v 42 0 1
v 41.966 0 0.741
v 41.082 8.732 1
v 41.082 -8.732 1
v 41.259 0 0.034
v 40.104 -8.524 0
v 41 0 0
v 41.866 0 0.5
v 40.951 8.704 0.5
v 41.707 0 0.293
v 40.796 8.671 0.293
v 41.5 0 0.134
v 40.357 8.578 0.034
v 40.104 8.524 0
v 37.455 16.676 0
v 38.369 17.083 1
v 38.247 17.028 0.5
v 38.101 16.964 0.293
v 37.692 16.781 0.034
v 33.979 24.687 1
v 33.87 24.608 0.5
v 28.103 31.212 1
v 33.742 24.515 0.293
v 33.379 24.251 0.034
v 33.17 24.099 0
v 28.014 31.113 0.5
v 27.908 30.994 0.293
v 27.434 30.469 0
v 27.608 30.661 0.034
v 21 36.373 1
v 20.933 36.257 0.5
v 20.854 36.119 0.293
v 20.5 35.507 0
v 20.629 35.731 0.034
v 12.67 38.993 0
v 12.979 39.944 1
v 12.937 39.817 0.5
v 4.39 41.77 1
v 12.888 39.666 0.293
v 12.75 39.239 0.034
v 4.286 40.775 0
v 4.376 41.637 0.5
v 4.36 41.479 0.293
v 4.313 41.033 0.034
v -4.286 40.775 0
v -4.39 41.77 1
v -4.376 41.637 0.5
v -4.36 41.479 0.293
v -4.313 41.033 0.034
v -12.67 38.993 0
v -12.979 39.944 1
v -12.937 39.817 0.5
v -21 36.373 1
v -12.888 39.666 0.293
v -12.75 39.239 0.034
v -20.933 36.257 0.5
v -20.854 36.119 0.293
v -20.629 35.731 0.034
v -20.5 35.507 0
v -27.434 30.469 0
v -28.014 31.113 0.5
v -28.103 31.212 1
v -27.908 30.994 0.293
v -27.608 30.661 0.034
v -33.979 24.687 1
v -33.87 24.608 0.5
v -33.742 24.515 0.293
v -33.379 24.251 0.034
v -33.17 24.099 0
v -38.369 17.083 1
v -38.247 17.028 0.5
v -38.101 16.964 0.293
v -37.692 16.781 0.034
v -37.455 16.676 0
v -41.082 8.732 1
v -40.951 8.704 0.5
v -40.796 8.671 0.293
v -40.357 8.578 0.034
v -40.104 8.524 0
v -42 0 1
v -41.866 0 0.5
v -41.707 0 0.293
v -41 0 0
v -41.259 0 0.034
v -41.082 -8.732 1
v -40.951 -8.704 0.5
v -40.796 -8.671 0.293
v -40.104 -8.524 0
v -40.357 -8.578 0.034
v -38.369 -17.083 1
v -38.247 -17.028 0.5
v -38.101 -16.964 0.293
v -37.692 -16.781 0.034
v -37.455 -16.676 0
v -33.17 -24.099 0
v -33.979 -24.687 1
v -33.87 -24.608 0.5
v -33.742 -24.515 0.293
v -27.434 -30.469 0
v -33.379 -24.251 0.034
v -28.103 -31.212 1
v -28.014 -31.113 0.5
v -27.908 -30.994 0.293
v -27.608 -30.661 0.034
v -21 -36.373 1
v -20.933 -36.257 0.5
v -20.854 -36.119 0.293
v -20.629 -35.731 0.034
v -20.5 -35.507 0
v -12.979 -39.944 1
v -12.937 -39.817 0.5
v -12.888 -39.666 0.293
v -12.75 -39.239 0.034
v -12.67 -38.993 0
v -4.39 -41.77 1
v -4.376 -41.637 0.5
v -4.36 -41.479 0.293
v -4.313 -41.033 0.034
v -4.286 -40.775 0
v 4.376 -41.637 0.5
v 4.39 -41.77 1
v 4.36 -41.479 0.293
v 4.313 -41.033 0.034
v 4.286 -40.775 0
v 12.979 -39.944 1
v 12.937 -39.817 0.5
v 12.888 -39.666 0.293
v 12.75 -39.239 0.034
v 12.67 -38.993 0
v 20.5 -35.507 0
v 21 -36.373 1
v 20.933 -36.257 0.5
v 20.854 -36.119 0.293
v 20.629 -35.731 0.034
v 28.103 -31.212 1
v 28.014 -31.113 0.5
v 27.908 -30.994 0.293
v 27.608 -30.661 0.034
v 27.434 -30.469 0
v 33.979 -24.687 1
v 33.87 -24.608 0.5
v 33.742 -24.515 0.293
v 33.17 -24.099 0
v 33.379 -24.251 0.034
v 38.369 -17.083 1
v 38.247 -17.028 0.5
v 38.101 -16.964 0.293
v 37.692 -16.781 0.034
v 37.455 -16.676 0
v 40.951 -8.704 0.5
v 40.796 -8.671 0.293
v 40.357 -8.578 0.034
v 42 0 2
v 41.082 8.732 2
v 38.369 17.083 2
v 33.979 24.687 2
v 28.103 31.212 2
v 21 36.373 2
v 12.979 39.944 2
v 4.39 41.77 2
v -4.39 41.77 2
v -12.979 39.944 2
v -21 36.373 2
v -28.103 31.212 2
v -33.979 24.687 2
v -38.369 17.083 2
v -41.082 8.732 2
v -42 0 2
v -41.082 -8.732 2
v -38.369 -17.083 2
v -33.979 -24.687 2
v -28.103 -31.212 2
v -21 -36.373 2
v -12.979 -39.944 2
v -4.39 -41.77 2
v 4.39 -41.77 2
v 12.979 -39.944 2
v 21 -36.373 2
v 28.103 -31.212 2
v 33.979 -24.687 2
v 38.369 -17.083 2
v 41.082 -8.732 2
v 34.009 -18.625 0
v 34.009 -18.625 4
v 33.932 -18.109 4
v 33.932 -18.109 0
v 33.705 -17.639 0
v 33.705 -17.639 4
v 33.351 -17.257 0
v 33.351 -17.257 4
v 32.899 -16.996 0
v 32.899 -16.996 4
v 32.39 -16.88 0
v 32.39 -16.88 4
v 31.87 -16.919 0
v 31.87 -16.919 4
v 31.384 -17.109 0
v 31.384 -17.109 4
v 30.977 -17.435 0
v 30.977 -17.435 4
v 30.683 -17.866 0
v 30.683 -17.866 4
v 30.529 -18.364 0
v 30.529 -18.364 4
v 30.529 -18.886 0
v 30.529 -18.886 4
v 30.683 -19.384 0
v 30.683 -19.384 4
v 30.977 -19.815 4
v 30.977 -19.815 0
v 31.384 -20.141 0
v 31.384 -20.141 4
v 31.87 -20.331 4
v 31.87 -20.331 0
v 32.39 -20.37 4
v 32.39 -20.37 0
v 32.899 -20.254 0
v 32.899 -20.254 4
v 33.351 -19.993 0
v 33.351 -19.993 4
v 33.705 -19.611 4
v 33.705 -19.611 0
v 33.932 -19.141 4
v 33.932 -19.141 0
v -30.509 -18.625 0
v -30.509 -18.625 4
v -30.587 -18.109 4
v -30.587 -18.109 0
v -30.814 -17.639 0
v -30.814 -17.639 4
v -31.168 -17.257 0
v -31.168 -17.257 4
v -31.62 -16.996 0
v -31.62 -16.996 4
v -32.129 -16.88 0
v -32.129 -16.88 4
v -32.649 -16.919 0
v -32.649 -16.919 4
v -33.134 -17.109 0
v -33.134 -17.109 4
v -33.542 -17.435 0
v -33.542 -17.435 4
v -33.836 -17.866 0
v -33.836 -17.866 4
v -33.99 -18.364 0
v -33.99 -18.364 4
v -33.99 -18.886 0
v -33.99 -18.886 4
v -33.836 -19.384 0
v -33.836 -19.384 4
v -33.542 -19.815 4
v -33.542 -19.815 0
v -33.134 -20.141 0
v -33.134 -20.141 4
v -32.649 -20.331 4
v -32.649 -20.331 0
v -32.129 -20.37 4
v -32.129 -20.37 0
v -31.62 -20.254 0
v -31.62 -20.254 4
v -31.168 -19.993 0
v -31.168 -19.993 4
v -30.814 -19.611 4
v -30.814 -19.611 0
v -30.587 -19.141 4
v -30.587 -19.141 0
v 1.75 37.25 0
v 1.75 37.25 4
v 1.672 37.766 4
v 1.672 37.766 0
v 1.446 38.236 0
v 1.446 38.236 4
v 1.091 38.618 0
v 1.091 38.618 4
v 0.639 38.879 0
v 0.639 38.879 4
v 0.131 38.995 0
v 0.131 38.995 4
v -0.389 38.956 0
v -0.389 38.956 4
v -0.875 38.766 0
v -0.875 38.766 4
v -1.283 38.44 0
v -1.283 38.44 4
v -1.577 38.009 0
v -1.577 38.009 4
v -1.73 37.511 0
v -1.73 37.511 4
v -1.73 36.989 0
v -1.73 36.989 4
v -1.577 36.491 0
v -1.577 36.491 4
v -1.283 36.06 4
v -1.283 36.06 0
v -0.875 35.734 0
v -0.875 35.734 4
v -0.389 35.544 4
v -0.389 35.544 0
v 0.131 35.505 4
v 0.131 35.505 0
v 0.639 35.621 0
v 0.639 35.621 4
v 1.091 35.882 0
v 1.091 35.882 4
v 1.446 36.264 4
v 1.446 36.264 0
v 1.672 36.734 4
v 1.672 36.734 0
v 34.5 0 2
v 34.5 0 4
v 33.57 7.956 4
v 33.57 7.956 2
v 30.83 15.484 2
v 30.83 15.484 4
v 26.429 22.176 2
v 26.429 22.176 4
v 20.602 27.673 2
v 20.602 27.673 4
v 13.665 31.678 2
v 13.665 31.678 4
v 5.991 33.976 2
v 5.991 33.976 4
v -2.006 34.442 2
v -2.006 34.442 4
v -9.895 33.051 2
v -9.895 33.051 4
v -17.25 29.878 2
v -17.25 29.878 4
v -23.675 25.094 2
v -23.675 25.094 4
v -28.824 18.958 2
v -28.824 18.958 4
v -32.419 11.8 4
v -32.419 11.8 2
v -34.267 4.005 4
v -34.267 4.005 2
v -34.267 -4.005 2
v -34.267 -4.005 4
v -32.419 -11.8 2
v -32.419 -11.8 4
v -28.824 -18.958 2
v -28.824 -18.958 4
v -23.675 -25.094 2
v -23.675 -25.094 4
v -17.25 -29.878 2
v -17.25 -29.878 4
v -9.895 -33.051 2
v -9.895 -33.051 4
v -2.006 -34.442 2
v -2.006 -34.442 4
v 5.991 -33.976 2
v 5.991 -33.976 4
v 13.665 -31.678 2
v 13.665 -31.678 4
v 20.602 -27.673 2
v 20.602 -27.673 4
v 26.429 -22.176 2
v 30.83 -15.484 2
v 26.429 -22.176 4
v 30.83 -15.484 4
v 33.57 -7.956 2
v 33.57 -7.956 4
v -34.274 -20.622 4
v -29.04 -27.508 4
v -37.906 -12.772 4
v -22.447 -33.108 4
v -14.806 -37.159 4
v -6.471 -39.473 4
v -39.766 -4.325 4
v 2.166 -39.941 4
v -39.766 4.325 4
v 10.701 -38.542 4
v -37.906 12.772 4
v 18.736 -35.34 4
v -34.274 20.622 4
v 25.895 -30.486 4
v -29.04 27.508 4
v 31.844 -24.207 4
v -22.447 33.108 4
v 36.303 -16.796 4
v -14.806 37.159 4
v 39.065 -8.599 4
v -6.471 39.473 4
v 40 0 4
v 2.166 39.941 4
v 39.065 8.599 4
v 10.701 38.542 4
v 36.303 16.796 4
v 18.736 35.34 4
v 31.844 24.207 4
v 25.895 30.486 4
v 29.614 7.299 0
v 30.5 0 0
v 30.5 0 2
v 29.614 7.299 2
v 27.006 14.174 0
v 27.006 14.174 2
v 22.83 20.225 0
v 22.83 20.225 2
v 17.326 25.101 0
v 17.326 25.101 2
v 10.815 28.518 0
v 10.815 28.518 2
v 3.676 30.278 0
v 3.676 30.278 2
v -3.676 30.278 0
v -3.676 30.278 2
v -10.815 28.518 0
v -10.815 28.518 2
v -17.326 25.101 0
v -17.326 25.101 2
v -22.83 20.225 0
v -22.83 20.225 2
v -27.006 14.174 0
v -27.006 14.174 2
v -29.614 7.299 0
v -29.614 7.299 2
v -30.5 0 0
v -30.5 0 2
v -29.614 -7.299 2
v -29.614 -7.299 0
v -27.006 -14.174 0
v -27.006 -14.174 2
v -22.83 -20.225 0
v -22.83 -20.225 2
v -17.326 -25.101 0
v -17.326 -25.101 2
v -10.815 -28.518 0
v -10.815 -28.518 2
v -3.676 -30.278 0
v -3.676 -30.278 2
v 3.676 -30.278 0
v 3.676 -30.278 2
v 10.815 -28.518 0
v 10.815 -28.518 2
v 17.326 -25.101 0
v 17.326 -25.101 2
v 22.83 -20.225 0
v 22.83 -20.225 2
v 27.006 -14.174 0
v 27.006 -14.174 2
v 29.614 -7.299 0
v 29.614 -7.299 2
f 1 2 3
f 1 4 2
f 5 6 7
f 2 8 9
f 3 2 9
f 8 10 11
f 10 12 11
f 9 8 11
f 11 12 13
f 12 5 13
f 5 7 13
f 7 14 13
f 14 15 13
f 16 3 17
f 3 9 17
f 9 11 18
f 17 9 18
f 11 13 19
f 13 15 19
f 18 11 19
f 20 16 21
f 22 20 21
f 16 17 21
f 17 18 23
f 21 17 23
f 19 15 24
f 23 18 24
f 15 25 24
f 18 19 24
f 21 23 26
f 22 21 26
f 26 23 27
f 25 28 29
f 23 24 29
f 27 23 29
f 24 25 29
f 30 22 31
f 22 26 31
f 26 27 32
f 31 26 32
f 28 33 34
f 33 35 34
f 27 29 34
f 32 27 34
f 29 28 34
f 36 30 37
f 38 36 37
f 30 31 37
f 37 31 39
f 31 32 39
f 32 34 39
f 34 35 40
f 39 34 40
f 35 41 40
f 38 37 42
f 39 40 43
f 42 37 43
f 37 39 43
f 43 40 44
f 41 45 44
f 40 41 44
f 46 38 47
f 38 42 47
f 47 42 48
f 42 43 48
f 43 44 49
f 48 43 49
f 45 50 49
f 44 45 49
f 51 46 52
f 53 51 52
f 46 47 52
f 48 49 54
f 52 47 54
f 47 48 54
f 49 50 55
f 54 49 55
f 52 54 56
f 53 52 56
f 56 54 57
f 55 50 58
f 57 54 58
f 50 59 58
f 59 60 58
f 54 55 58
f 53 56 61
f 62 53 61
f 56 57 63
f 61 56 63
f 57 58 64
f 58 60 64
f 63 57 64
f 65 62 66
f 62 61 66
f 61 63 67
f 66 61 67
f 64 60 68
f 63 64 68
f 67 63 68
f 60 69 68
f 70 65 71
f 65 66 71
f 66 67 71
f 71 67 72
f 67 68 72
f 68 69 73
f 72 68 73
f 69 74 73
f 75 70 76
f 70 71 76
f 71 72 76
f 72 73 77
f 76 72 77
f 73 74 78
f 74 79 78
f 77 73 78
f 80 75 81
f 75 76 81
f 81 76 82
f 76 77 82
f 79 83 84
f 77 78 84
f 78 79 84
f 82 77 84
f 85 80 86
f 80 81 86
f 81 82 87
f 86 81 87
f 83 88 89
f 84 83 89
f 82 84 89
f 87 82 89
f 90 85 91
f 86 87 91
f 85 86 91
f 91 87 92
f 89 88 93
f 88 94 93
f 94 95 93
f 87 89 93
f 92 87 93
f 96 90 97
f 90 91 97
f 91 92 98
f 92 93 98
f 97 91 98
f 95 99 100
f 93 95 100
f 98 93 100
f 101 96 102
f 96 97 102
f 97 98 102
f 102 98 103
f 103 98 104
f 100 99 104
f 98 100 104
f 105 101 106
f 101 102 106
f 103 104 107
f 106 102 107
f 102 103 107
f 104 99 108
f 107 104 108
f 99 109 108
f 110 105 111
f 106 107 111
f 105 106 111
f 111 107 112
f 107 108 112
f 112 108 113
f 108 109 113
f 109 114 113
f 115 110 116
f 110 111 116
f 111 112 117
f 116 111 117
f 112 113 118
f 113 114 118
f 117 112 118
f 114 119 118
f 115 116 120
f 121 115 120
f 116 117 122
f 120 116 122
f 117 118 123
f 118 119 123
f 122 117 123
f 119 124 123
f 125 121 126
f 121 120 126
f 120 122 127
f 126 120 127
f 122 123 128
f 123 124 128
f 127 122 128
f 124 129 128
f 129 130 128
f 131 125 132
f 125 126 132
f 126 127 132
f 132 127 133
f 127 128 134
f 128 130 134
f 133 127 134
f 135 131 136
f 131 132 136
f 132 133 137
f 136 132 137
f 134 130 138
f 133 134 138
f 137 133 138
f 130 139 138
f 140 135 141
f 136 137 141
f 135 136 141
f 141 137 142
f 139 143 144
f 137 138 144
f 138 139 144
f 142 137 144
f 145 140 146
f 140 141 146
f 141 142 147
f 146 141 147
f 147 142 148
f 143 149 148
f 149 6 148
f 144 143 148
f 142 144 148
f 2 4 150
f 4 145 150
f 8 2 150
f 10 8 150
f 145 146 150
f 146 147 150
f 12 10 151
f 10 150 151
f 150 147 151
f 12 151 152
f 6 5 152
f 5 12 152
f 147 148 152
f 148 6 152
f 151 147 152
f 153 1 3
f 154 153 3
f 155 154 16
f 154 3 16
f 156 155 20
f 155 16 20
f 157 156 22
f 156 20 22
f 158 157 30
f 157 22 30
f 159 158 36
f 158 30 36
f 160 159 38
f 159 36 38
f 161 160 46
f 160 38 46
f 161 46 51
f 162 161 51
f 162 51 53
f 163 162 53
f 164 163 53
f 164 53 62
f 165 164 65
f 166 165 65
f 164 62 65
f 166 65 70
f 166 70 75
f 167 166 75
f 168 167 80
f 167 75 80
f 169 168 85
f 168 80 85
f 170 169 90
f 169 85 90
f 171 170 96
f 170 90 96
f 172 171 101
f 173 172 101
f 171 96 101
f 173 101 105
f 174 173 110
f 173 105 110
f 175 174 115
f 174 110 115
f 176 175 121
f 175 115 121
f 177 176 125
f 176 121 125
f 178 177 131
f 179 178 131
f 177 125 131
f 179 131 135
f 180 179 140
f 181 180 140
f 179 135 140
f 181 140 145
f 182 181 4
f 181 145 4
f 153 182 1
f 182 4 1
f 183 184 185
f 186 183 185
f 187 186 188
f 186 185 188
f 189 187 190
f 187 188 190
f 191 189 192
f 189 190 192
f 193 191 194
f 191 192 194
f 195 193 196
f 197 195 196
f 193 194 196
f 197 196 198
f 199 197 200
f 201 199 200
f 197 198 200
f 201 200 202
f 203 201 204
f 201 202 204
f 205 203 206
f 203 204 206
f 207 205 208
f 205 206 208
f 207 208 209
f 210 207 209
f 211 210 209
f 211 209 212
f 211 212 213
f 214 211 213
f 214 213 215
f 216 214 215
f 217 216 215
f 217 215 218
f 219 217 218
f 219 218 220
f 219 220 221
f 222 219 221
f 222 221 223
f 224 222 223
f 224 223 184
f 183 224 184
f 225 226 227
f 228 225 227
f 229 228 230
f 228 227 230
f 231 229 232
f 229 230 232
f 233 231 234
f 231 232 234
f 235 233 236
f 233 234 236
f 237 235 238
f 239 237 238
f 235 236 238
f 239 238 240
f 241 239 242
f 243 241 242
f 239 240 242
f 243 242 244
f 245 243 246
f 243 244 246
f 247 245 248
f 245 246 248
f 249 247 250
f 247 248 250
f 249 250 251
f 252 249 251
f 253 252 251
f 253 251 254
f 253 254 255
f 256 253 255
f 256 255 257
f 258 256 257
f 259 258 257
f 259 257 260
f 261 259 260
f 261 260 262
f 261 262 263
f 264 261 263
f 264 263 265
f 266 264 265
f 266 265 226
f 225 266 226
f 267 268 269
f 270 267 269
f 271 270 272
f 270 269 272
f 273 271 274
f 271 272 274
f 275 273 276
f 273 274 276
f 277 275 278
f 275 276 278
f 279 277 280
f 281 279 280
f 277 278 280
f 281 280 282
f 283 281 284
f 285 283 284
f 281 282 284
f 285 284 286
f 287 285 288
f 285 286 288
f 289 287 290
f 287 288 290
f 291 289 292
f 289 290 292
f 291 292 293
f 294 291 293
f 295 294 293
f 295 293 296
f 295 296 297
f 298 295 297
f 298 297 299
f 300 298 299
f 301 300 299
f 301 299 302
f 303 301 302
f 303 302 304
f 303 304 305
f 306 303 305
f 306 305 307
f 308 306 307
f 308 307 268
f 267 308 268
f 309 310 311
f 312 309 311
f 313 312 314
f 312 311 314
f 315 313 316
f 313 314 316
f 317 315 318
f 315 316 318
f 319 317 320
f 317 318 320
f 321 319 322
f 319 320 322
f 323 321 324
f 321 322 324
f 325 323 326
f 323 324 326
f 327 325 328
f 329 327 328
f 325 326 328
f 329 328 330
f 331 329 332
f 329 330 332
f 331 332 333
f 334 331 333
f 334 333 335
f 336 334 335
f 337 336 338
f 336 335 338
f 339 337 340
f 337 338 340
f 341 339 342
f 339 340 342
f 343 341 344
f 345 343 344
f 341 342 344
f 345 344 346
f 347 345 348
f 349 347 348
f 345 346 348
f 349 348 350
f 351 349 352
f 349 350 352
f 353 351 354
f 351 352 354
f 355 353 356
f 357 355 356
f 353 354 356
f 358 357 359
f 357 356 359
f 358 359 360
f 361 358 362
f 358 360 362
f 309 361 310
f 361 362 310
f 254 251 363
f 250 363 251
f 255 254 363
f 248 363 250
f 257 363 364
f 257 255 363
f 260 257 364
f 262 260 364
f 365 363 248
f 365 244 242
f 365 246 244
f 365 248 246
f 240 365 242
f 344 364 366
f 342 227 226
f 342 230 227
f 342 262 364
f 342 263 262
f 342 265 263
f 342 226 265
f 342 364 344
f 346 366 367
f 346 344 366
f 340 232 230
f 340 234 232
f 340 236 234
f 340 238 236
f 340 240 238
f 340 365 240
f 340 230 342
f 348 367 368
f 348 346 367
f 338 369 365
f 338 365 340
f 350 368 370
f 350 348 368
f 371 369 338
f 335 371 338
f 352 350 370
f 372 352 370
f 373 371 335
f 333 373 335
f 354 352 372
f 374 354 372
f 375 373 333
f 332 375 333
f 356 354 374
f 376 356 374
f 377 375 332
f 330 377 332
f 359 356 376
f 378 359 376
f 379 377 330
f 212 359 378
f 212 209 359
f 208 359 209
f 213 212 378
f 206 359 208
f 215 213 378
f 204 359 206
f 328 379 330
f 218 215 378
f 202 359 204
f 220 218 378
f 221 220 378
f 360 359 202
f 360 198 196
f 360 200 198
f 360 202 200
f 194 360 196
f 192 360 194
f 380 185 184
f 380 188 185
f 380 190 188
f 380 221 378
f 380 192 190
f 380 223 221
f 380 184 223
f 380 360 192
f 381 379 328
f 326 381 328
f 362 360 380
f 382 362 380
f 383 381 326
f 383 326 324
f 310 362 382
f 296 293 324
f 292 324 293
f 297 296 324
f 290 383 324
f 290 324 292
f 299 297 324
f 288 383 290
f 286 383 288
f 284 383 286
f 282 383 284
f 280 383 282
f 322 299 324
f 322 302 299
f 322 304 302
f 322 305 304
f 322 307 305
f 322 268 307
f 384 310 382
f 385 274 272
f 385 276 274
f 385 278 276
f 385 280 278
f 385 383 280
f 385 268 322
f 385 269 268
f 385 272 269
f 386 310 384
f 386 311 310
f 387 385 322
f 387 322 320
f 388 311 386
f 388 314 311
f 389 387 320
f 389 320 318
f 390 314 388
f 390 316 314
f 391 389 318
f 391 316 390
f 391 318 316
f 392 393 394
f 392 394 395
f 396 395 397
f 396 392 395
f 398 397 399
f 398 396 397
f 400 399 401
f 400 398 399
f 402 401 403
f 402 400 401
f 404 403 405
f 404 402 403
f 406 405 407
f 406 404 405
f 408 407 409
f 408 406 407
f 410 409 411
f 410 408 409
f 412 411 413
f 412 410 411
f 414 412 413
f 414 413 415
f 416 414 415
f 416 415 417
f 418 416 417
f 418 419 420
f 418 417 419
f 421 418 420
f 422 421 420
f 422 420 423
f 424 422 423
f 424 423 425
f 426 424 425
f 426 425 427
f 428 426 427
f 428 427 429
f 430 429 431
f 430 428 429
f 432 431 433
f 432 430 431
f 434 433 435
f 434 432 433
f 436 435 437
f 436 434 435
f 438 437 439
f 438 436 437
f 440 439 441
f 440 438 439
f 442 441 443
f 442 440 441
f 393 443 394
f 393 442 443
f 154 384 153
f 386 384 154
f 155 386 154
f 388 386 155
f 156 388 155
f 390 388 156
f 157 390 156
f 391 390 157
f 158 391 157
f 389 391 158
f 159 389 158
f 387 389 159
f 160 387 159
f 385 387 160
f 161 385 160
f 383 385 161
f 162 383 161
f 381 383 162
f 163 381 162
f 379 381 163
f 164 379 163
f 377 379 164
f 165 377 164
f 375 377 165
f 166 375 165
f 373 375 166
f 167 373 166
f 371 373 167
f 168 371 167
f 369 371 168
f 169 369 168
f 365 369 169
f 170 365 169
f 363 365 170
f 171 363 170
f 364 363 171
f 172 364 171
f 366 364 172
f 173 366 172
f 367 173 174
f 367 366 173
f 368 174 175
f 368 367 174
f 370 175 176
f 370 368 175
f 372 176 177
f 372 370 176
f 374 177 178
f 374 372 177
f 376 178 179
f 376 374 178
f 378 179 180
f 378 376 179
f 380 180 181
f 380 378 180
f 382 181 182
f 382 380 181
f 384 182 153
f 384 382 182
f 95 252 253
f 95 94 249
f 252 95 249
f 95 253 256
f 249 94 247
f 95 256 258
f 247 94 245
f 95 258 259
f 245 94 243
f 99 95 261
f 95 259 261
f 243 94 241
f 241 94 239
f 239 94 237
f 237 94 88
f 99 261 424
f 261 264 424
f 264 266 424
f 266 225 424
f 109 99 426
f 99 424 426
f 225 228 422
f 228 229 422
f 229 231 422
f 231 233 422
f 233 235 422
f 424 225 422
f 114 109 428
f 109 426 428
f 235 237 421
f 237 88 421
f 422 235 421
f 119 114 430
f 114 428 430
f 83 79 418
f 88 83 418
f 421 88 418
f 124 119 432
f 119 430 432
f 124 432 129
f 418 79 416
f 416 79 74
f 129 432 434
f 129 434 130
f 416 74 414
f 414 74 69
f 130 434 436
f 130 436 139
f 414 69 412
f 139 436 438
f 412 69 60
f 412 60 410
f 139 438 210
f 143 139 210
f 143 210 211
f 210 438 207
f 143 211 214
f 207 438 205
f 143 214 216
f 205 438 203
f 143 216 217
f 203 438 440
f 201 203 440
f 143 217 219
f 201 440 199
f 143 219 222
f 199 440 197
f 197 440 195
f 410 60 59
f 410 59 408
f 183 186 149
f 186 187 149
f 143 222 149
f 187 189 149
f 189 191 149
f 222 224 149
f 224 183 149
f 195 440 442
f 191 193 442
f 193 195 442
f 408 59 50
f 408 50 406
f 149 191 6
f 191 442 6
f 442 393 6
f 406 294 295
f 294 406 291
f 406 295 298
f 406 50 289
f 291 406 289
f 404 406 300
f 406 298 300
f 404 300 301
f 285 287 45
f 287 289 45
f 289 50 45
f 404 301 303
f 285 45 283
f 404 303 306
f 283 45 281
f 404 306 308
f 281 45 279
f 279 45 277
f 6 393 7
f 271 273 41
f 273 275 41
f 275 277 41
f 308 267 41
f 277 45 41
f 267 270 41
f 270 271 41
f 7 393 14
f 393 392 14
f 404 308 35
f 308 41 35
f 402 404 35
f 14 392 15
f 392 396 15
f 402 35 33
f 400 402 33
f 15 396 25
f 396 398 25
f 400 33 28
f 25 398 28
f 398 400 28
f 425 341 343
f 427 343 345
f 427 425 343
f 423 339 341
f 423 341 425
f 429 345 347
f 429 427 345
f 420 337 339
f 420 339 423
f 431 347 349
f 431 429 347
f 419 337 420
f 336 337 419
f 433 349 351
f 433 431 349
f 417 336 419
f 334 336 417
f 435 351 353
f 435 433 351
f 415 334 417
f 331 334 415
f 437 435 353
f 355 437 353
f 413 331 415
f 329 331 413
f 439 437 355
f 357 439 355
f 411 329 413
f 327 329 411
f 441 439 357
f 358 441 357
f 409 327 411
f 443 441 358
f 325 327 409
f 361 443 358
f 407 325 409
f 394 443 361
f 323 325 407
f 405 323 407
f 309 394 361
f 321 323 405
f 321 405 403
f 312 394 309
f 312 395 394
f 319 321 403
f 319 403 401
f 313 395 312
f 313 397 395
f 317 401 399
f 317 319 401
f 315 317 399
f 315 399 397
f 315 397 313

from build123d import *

# Parameters (mm, degrees)
SKETCH_1_R          = 42
SKETCH_1_R_2        = 30.5
EXTRUDE_1_DEPTH     = 4
CHAMFER_1_SIZE      = 2
SKETCH_3_R          = 34.5
CUT_EXTRUDE_2_DEPTH = 2
SKETCH_4_R          = 1.75
CUT_EXTRUDE_5_DEPTH = 60.531504265
FILLET_2_R          = 1


with BuildPart() as part:
    # Эскиз1 → Бобышка-Вытянуть1 (new body)
    with BuildSketch(Plane.XY):
        Circle(SKETCH_1_R)
        Circle(SKETCH_1_R_2, mode=Mode.SUBTRACT)
    extrude(amount=EXTRUDE_1_DEPTH)

    # Фаска1
    chamfer_1_edges = [part.edges().sort_by_distance(p)[0] for p in [
        (-42, 0, 4),
    ]]
    chamfer(chamfer_1_edges, length=CHAMFER_1_SIZE)

    # Эскиз3 → Вырез-Вытянуть2 (cut)
    with BuildSketch(Plane.XY.offset(4)):
        Circle(SKETCH_3_R)
    extrude(amount=-CUT_EXTRUDE_2_DEPTH, mode=Mode.SUBTRACT)

    # Эскиз4 → Вырез-Вытянуть5 (cut, through all)
    with BuildSketch(Plane.XY.offset(4)):
        with Locations((0, 37.25)):
            Circle(SKETCH_4_R)
        with Locations((32.259446291, -18.625)):
            Circle(SKETCH_4_R)
        with Locations((-32.259446291, -18.625)):
            Circle(SKETCH_4_R)
    extrude(amount=-CUT_EXTRUDE_5_DEPTH, mode=Mode.SUBTRACT)

    # Скругление2
    fillet_2_edges = [part.edges().sort_by_distance(p)[0] for p in [
        (-42, 0, 0),
    ]]
    fillet(fillet_2_edges, radius=FILLET_2_R)


solid = part.part
